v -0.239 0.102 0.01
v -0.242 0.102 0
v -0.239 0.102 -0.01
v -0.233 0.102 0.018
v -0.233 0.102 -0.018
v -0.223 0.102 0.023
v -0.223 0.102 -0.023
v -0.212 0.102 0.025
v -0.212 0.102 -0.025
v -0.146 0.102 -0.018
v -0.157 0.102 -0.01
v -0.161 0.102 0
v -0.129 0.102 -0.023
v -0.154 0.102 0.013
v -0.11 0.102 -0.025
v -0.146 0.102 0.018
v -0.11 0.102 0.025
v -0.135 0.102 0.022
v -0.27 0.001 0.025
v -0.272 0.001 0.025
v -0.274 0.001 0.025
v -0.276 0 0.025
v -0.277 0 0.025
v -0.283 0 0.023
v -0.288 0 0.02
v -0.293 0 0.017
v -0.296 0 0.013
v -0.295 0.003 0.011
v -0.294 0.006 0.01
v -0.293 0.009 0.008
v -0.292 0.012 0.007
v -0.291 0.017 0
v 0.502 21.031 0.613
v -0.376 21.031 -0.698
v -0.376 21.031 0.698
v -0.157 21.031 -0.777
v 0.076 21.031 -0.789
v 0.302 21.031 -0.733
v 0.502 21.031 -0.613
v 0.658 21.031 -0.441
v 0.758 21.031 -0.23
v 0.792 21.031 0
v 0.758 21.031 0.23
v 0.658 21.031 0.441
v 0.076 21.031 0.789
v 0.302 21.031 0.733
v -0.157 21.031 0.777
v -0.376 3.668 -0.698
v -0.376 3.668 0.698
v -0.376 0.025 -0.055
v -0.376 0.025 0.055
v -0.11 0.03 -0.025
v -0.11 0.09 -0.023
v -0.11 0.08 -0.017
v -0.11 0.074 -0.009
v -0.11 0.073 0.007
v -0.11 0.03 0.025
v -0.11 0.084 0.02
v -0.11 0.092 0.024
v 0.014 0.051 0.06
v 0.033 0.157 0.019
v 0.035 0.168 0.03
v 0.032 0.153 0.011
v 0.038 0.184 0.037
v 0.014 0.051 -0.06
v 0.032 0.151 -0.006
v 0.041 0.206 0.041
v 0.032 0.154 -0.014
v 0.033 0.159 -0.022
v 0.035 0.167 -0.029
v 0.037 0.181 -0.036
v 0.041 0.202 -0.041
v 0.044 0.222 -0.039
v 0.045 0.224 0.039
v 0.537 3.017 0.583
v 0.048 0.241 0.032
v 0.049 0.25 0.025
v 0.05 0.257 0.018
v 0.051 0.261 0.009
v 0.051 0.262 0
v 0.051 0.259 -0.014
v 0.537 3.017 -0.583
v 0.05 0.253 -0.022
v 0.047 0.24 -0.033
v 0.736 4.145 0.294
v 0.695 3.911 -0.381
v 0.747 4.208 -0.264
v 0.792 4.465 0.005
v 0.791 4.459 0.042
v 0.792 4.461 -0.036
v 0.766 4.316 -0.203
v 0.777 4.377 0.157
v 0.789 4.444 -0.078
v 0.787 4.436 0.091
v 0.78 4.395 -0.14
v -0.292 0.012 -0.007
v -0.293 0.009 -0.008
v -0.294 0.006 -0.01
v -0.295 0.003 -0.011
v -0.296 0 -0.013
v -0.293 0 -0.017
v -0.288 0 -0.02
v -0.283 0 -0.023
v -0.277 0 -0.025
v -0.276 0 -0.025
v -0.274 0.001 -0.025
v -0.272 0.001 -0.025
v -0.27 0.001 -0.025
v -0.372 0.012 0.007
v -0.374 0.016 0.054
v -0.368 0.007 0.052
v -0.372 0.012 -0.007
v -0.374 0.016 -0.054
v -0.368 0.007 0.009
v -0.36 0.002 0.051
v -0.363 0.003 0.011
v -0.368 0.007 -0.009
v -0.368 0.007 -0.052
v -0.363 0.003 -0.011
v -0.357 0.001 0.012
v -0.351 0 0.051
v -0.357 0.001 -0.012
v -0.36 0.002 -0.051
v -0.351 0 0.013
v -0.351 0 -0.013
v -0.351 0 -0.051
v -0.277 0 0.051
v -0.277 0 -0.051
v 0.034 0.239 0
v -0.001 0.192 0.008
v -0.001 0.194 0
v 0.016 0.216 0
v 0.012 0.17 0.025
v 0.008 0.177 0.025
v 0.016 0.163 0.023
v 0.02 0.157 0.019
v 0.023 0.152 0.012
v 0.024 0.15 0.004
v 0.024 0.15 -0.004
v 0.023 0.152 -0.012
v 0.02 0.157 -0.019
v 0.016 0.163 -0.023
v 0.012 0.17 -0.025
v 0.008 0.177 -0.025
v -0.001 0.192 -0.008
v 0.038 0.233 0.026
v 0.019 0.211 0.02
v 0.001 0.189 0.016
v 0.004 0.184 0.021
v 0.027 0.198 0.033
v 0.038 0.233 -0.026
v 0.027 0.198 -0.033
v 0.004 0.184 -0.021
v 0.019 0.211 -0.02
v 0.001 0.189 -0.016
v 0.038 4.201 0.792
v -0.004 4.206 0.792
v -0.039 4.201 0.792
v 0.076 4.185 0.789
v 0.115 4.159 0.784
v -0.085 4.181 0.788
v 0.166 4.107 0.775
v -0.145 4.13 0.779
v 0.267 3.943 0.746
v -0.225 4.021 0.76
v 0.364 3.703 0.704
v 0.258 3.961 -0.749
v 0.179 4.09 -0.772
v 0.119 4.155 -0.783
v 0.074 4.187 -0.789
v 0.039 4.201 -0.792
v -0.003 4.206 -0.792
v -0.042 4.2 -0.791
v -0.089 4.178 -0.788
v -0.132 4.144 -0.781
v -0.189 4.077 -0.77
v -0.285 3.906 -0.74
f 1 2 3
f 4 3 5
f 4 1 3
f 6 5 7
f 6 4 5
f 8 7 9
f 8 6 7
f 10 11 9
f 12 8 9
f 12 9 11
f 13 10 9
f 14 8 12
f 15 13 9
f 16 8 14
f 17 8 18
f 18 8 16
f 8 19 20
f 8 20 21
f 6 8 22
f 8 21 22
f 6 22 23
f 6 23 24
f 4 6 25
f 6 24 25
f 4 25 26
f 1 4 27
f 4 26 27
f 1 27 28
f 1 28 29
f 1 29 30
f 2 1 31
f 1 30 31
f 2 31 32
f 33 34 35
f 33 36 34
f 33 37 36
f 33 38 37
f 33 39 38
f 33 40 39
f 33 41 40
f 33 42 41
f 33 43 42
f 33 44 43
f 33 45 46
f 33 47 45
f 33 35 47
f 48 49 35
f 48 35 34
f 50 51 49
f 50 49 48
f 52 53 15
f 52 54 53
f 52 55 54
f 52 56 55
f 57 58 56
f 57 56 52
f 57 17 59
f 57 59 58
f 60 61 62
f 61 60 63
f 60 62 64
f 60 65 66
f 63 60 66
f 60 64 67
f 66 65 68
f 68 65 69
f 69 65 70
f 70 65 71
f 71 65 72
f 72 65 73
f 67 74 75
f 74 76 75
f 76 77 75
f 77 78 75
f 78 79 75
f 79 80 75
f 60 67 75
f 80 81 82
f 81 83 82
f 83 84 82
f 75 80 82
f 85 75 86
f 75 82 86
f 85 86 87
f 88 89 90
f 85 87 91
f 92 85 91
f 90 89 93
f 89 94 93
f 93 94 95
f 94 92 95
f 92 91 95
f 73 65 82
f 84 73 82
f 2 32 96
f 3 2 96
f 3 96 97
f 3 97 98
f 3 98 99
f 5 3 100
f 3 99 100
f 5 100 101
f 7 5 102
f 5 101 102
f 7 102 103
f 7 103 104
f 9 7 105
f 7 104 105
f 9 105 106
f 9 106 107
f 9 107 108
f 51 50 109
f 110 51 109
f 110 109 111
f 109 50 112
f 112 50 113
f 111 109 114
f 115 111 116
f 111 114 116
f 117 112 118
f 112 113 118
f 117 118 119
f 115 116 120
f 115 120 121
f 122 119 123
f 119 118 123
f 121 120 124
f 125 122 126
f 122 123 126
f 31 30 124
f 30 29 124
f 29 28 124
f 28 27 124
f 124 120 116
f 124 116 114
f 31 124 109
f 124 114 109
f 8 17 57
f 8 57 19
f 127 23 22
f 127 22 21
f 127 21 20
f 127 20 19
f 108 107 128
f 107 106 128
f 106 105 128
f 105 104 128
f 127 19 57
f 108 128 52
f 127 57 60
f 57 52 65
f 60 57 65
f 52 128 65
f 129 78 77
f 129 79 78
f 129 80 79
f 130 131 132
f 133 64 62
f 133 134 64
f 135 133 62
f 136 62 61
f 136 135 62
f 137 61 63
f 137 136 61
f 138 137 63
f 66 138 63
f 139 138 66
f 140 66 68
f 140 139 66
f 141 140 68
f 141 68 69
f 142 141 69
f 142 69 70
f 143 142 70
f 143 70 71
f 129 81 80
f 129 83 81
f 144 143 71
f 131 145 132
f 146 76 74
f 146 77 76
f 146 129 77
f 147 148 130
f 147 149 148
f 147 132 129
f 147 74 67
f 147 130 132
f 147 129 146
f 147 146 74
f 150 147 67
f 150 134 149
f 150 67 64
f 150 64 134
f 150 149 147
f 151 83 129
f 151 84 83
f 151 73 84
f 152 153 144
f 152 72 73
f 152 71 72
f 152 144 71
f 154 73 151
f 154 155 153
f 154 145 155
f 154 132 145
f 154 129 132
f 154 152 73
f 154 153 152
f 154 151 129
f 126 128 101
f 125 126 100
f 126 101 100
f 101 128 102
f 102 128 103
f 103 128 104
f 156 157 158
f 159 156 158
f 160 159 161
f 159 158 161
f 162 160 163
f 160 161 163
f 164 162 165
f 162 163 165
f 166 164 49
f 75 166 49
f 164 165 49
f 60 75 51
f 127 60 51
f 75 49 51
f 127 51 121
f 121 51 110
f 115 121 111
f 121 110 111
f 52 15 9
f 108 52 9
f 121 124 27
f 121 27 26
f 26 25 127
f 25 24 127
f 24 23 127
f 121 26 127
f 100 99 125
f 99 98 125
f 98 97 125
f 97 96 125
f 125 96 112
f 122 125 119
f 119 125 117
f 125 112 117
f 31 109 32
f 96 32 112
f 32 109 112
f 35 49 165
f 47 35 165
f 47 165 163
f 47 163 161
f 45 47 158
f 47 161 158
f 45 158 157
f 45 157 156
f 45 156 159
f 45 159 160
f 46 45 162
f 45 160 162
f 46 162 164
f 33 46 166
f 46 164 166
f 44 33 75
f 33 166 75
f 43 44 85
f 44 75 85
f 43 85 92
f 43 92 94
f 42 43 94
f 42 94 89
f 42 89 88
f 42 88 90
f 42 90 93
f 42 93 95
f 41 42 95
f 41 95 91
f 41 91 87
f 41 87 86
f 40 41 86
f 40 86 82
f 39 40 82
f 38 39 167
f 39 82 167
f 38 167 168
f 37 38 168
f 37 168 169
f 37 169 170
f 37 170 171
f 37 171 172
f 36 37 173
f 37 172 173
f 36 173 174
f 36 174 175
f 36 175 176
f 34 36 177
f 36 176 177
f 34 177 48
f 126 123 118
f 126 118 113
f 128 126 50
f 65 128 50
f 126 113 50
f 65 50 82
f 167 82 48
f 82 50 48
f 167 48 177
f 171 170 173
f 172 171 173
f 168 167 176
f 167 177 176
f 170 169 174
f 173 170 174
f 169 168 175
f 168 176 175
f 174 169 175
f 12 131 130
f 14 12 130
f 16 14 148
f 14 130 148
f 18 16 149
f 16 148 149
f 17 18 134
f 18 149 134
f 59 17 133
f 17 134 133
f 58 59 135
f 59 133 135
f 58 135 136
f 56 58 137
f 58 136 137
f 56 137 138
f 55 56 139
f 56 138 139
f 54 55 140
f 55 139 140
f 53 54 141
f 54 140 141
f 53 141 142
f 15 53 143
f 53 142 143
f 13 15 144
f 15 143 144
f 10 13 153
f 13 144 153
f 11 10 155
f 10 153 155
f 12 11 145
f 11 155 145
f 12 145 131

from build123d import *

# Parameters (mm, degrees)
TD_SKETCH_R                             = 0.79248
TL_FEATURE_DEPTH                        = 21.0312
TDF_STD_SKETCH_W                        = 2.09296
TDF_STD_SKETCH_H                        = 2.09296
TDF_STD_FEATURE_DEPTH                   = 22.061040395
ISA_20_STD_FEATURE_DEPTH                = 22.061040395
ISA_20_STD_FEATURE_DEPTH_BACK           = 22.061040395
F_10BA_STD_FEATURE_DEPTH                = 22.061040395
F_10BA_STD_FEATURE_DEPTH_BACK           = 22.061040395
FRO_STD_FEATURE_DEPTH                   = 22.061040395
FRO_STD_FEATURE_DEPTH_BACK              = 22.061040395
VG_STD_FEATURE_DEPTH                    = 22.061040395
VG_STD_FEATURE_DEPTH_BACK               = 22.061040395
ERW_STD_FEATURE_DEPTH                   = 0.0254
H_STD_FEATURE_REACH                     = 22.889
H_STD_SKETCH_R                          = 0.0254
H_STD_SKETCH_3_R                        = 0.0254
FUNNEL_FINAL_DIAMETRE_STD_FEATURE_DEPTH = 2.499995
FUNNEL_FINAL_DIAMETRE_STD_FEATURE_DRAFT = -22.5
ROUND_BR_STD_FEATURE_START              = -1
ROUND_BR_STD_FEATURE_DEPTH              = 1.033123165


with BuildPart() as part:
    # TD_sketch → TL_feature (new body)
    with BuildSketch(Plane(origin=(0, 0, 0), x_dir=(1, 0, 0), z_dir=(0, 1, 0))):
        with Locations(Location((0, 0, 0), (0, 0, 270))):
            Circle(TD_SKETCH_R)
    extrude(amount=TL_FEATURE_DEPTH)

    # TDF_STD_sketch → TDF_STD_feature (cut, through all)
    with BuildSketch(Plane(origin=(0, 0, 0), x_dir=(1, 0, 0), z_dir=(0, 1, 0))):
        with Locations((-1.4224, 0)):
            Rectangle(TDF_STD_SKETCH_W, TDF_STD_SKETCH_H)
    extrude(amount=TDF_STD_FEATURE_DEPTH, mode=Mode.SUBTRACT)

    # ISA_20_STD_sketch → ISA_20_STD_feature (cut, two sides: drawn at the far end of the back side and taken through both)
    with BuildSketch(Plane(origin=(0, 0, 0), x_dir=(0, 0, -1), z_dir=(1, 0, 0)).offset(-ISA_20_STD_FEATURE_DEPTH_BACK)):
        Polygon((-12.968809457, 73.261672178), (-3.759167997, 21.0312), (-0.0508, 0), (0.0508, 0), (3.759167997, 21.0312), (12.968809457, 73.261672178), (12.968809457, -32.810750623), (-12.968809457, -32.810750623), align=None)
    extrude(amount=ISA_20_STD_FEATURE_DEPTH + ISA_20_STD_FEATURE_DEPTH_BACK, mode=Mode.SUBTRACT)

    # 10BA_STD_sketch → 10BA_STD_feature (cut, two sides: drawn at the far end of the back side and taken through both)
    with BuildSketch(Plane.XY.offset(-F_10BA_STD_FEATURE_DEPTH_BACK)):
        Polygon((-53.226091717, 0), (-0.37592, 0), (-0.277370032, 0), (0.014143507, 0.051401702), (3.713447997, 21.0312), (12.890784005, 73.078458855), (91.272293615, 2.163710365), (25.155417893, -70.914748491), align=None)
    extrude(amount=F_10BA_STD_FEATURE_DEPTH + F_10BA_STD_FEATURE_DEPTH_BACK, mode=Mode.SUBTRACT)

    # FRO_STD_sketch → FRO_STD_feature (cut, two sides: drawn at the far end of the back side and taken through both)
    with BuildSketch(Plane.XY.offset(-FRO_STD_FEATURE_DEPTH_BACK)):
        with BuildLine():
            Line((-0.37592, 52.149873762), (-0.37592, 0.0254))
            ThreePointArc((-0.37592, 0.0254), (-0.368480512, 0.007439488), (-0.35052, 0))
            Line((-0.35052, 0), (51.773953762, 0))
            Line((51.773953762, 0), (-21.941183964, -73.715137726))
            Line((-21.941183964, -73.715137726), (-74.091057726, -21.565263964))
            Line((-74.091057726, -21.565263964), (-0.37592, 52.149873762))
        make_face()
    extrude(amount=FRO_STD_FEATURE_DEPTH + FRO_STD_FEATURE_DEPTH_BACK, mode=Mode.SUBTRACT)

    # VG_STD_sketch → VG_STD_feature (cut, two sides: drawn at the far end of the back side and taken through both)
    with BuildSketch(Plane(origin=(0, 0, 0), x_dir=(0, 0, -1), z_dir=(1, 0, 0)).offset(-VG_STD_FEATURE_DEPTH_BACK)):
        with BuildLine():
            Line((-0.0127, 0), (-0.006906065, 0.012425133))
            ThreePointArc((-0.006906065, 0.012425133), (0, 0.016824782), (0.006906065, 0.012425133))
            Line((0.006906065, 0.012425133), (0.0127, 0))
            Line((0.0127, 0), (-0.0127, 0))
        make_face()
    extrude(amount=VG_STD_FEATURE_DEPTH + VG_STD_FEATURE_DEPTH_BACK, mode=Mode.SUBTRACT)


with BuildPart() as body_2:
    # ERW_STD_sketch → ERW_STD_feature (new, symmetric)
    with BuildSketch(Plane.XY):
        Polygon((-0.109730032, 0.1016), (-0.109730032, 0), (-0.300230032, 0), (-0.241571245, 0.1016), align=None)
    extrude(amount=ERW_STD_FEATURE_DEPTH, both=True)

    # H_STD_sketch → H_STD_feature (add, up to next)
    with BuildSketch(Plane(origin=(0.011364425, 0.171513918, 0), x_dir=(0, 0, -1), z_dir=(0.8660254037844415, 0.4999999999999953, 0)), mode=Mode.PRIVATE) as h_std_feature_sk1:
        with Locations(Location((0, 0, 0), (0, 0, 90))):
            Circle(H_STD_SKETCH_R)
    h_std_feature_tool1 = extrude(h_std_feature_sk1.sketch, amount=-H_STD_FEATURE_REACH, mode=Mode.PRIVATE) - body_2.part
    add(h_std_feature_tool1.solids().sort_by_distance((0.011364, 0.171514, 0))[0])


with BuildPart() as funnel_final_diametre_std_feature_tool:
    # H_STD_sketch<3> → funnel_final_diametre_STD_feature (with draft: the straight prism first)
    with BuildSketch(Plane(origin=(0.011364425, 0.171513918, 0), x_dir=(0, 0, -1), z_dir=(0.8660254037844415, 0.4999999999999953, 0))):
        with Locations(Location((0, 0, 0), (0, 0, 90))):
            Circle(H_STD_SKETCH_3_R)
    extrude(amount=FUNNEL_FINAL_DIAMETRE_STD_FEATURE_DEPTH)
    # funnel_final_diametre_STD_feature: the draft: its side faces are tilted about the plane it starts from
    funnel_final_diametre_std_feature_sides = [funnel_final_diametre_std_feature_tool.faces().sort_by_distance(p)[0] for p in [
        (1.106594015, 0.774515622, 0),
    ]]
    draft(funnel_final_diametre_std_feature_sides, Plane(origin=(0.011364425, 0.171513918, 0), x_dir=(0, 0, -1), z_dir=(0.8660254037844415, 0.4999999999999953, 0)), FUNNEL_FINAL_DIAMETRE_STD_FEATURE_DRAFT)


with BuildPart() as body_2_1:
    add(body_2.part)

    # funnel_final_diametre_STD_feature: add funnel_final_diametre_std_feature_tool
    add(funnel_final_diametre_std_feature_tool.part)

    # ROUND_BR_STD_feature: read off the stored shape, not the designer's step
    # ROUND_BR_STD_feature outline → ROUND_BR_STD_feature (cut)
    with BuildSketch(Plane(origin=(0, 0, 0), x_dir=(0.8660254037844362, -0.5000000000000042, 0), z_dir=(0.5000000000000042, 0.8660254037844363, 0)).offset(ROUND_BR_STD_FEATURE_START)):
        with BuildLine():
            Line((-0.260006835, -0.0254), (-0.234606835, -0.0254))
            ThreePointArc((-0.234606835, -0.0254), (-0.252567347, -0.017960512), (-0.260006835, 0))
            Line((-0.260006835, 0), (-0.260006835, -0.0254))
        make_face()
        with BuildLine():
            Line((-0.260006835, 0.0254), (-0.260006835, 0))
            ThreePointArc((-0.260006835, 0), (-0.252567347, 0.017960512), (-0.234606835, 0.0254))
            Line((-0.234606835, 0.0254), (-0.260006835, 0.0254))
        make_face()
    extrude(amount=ROUND_BR_STD_FEATURE_DEPTH, mode=Mode.SUBTRACT)


with BuildPart() as part_1:
    add(part.part)

    # COMBINE_STD_feature: cut body 2
    add(body_2_1.part, mode=Mode.SUBTRACT)


solid = part_1.part
